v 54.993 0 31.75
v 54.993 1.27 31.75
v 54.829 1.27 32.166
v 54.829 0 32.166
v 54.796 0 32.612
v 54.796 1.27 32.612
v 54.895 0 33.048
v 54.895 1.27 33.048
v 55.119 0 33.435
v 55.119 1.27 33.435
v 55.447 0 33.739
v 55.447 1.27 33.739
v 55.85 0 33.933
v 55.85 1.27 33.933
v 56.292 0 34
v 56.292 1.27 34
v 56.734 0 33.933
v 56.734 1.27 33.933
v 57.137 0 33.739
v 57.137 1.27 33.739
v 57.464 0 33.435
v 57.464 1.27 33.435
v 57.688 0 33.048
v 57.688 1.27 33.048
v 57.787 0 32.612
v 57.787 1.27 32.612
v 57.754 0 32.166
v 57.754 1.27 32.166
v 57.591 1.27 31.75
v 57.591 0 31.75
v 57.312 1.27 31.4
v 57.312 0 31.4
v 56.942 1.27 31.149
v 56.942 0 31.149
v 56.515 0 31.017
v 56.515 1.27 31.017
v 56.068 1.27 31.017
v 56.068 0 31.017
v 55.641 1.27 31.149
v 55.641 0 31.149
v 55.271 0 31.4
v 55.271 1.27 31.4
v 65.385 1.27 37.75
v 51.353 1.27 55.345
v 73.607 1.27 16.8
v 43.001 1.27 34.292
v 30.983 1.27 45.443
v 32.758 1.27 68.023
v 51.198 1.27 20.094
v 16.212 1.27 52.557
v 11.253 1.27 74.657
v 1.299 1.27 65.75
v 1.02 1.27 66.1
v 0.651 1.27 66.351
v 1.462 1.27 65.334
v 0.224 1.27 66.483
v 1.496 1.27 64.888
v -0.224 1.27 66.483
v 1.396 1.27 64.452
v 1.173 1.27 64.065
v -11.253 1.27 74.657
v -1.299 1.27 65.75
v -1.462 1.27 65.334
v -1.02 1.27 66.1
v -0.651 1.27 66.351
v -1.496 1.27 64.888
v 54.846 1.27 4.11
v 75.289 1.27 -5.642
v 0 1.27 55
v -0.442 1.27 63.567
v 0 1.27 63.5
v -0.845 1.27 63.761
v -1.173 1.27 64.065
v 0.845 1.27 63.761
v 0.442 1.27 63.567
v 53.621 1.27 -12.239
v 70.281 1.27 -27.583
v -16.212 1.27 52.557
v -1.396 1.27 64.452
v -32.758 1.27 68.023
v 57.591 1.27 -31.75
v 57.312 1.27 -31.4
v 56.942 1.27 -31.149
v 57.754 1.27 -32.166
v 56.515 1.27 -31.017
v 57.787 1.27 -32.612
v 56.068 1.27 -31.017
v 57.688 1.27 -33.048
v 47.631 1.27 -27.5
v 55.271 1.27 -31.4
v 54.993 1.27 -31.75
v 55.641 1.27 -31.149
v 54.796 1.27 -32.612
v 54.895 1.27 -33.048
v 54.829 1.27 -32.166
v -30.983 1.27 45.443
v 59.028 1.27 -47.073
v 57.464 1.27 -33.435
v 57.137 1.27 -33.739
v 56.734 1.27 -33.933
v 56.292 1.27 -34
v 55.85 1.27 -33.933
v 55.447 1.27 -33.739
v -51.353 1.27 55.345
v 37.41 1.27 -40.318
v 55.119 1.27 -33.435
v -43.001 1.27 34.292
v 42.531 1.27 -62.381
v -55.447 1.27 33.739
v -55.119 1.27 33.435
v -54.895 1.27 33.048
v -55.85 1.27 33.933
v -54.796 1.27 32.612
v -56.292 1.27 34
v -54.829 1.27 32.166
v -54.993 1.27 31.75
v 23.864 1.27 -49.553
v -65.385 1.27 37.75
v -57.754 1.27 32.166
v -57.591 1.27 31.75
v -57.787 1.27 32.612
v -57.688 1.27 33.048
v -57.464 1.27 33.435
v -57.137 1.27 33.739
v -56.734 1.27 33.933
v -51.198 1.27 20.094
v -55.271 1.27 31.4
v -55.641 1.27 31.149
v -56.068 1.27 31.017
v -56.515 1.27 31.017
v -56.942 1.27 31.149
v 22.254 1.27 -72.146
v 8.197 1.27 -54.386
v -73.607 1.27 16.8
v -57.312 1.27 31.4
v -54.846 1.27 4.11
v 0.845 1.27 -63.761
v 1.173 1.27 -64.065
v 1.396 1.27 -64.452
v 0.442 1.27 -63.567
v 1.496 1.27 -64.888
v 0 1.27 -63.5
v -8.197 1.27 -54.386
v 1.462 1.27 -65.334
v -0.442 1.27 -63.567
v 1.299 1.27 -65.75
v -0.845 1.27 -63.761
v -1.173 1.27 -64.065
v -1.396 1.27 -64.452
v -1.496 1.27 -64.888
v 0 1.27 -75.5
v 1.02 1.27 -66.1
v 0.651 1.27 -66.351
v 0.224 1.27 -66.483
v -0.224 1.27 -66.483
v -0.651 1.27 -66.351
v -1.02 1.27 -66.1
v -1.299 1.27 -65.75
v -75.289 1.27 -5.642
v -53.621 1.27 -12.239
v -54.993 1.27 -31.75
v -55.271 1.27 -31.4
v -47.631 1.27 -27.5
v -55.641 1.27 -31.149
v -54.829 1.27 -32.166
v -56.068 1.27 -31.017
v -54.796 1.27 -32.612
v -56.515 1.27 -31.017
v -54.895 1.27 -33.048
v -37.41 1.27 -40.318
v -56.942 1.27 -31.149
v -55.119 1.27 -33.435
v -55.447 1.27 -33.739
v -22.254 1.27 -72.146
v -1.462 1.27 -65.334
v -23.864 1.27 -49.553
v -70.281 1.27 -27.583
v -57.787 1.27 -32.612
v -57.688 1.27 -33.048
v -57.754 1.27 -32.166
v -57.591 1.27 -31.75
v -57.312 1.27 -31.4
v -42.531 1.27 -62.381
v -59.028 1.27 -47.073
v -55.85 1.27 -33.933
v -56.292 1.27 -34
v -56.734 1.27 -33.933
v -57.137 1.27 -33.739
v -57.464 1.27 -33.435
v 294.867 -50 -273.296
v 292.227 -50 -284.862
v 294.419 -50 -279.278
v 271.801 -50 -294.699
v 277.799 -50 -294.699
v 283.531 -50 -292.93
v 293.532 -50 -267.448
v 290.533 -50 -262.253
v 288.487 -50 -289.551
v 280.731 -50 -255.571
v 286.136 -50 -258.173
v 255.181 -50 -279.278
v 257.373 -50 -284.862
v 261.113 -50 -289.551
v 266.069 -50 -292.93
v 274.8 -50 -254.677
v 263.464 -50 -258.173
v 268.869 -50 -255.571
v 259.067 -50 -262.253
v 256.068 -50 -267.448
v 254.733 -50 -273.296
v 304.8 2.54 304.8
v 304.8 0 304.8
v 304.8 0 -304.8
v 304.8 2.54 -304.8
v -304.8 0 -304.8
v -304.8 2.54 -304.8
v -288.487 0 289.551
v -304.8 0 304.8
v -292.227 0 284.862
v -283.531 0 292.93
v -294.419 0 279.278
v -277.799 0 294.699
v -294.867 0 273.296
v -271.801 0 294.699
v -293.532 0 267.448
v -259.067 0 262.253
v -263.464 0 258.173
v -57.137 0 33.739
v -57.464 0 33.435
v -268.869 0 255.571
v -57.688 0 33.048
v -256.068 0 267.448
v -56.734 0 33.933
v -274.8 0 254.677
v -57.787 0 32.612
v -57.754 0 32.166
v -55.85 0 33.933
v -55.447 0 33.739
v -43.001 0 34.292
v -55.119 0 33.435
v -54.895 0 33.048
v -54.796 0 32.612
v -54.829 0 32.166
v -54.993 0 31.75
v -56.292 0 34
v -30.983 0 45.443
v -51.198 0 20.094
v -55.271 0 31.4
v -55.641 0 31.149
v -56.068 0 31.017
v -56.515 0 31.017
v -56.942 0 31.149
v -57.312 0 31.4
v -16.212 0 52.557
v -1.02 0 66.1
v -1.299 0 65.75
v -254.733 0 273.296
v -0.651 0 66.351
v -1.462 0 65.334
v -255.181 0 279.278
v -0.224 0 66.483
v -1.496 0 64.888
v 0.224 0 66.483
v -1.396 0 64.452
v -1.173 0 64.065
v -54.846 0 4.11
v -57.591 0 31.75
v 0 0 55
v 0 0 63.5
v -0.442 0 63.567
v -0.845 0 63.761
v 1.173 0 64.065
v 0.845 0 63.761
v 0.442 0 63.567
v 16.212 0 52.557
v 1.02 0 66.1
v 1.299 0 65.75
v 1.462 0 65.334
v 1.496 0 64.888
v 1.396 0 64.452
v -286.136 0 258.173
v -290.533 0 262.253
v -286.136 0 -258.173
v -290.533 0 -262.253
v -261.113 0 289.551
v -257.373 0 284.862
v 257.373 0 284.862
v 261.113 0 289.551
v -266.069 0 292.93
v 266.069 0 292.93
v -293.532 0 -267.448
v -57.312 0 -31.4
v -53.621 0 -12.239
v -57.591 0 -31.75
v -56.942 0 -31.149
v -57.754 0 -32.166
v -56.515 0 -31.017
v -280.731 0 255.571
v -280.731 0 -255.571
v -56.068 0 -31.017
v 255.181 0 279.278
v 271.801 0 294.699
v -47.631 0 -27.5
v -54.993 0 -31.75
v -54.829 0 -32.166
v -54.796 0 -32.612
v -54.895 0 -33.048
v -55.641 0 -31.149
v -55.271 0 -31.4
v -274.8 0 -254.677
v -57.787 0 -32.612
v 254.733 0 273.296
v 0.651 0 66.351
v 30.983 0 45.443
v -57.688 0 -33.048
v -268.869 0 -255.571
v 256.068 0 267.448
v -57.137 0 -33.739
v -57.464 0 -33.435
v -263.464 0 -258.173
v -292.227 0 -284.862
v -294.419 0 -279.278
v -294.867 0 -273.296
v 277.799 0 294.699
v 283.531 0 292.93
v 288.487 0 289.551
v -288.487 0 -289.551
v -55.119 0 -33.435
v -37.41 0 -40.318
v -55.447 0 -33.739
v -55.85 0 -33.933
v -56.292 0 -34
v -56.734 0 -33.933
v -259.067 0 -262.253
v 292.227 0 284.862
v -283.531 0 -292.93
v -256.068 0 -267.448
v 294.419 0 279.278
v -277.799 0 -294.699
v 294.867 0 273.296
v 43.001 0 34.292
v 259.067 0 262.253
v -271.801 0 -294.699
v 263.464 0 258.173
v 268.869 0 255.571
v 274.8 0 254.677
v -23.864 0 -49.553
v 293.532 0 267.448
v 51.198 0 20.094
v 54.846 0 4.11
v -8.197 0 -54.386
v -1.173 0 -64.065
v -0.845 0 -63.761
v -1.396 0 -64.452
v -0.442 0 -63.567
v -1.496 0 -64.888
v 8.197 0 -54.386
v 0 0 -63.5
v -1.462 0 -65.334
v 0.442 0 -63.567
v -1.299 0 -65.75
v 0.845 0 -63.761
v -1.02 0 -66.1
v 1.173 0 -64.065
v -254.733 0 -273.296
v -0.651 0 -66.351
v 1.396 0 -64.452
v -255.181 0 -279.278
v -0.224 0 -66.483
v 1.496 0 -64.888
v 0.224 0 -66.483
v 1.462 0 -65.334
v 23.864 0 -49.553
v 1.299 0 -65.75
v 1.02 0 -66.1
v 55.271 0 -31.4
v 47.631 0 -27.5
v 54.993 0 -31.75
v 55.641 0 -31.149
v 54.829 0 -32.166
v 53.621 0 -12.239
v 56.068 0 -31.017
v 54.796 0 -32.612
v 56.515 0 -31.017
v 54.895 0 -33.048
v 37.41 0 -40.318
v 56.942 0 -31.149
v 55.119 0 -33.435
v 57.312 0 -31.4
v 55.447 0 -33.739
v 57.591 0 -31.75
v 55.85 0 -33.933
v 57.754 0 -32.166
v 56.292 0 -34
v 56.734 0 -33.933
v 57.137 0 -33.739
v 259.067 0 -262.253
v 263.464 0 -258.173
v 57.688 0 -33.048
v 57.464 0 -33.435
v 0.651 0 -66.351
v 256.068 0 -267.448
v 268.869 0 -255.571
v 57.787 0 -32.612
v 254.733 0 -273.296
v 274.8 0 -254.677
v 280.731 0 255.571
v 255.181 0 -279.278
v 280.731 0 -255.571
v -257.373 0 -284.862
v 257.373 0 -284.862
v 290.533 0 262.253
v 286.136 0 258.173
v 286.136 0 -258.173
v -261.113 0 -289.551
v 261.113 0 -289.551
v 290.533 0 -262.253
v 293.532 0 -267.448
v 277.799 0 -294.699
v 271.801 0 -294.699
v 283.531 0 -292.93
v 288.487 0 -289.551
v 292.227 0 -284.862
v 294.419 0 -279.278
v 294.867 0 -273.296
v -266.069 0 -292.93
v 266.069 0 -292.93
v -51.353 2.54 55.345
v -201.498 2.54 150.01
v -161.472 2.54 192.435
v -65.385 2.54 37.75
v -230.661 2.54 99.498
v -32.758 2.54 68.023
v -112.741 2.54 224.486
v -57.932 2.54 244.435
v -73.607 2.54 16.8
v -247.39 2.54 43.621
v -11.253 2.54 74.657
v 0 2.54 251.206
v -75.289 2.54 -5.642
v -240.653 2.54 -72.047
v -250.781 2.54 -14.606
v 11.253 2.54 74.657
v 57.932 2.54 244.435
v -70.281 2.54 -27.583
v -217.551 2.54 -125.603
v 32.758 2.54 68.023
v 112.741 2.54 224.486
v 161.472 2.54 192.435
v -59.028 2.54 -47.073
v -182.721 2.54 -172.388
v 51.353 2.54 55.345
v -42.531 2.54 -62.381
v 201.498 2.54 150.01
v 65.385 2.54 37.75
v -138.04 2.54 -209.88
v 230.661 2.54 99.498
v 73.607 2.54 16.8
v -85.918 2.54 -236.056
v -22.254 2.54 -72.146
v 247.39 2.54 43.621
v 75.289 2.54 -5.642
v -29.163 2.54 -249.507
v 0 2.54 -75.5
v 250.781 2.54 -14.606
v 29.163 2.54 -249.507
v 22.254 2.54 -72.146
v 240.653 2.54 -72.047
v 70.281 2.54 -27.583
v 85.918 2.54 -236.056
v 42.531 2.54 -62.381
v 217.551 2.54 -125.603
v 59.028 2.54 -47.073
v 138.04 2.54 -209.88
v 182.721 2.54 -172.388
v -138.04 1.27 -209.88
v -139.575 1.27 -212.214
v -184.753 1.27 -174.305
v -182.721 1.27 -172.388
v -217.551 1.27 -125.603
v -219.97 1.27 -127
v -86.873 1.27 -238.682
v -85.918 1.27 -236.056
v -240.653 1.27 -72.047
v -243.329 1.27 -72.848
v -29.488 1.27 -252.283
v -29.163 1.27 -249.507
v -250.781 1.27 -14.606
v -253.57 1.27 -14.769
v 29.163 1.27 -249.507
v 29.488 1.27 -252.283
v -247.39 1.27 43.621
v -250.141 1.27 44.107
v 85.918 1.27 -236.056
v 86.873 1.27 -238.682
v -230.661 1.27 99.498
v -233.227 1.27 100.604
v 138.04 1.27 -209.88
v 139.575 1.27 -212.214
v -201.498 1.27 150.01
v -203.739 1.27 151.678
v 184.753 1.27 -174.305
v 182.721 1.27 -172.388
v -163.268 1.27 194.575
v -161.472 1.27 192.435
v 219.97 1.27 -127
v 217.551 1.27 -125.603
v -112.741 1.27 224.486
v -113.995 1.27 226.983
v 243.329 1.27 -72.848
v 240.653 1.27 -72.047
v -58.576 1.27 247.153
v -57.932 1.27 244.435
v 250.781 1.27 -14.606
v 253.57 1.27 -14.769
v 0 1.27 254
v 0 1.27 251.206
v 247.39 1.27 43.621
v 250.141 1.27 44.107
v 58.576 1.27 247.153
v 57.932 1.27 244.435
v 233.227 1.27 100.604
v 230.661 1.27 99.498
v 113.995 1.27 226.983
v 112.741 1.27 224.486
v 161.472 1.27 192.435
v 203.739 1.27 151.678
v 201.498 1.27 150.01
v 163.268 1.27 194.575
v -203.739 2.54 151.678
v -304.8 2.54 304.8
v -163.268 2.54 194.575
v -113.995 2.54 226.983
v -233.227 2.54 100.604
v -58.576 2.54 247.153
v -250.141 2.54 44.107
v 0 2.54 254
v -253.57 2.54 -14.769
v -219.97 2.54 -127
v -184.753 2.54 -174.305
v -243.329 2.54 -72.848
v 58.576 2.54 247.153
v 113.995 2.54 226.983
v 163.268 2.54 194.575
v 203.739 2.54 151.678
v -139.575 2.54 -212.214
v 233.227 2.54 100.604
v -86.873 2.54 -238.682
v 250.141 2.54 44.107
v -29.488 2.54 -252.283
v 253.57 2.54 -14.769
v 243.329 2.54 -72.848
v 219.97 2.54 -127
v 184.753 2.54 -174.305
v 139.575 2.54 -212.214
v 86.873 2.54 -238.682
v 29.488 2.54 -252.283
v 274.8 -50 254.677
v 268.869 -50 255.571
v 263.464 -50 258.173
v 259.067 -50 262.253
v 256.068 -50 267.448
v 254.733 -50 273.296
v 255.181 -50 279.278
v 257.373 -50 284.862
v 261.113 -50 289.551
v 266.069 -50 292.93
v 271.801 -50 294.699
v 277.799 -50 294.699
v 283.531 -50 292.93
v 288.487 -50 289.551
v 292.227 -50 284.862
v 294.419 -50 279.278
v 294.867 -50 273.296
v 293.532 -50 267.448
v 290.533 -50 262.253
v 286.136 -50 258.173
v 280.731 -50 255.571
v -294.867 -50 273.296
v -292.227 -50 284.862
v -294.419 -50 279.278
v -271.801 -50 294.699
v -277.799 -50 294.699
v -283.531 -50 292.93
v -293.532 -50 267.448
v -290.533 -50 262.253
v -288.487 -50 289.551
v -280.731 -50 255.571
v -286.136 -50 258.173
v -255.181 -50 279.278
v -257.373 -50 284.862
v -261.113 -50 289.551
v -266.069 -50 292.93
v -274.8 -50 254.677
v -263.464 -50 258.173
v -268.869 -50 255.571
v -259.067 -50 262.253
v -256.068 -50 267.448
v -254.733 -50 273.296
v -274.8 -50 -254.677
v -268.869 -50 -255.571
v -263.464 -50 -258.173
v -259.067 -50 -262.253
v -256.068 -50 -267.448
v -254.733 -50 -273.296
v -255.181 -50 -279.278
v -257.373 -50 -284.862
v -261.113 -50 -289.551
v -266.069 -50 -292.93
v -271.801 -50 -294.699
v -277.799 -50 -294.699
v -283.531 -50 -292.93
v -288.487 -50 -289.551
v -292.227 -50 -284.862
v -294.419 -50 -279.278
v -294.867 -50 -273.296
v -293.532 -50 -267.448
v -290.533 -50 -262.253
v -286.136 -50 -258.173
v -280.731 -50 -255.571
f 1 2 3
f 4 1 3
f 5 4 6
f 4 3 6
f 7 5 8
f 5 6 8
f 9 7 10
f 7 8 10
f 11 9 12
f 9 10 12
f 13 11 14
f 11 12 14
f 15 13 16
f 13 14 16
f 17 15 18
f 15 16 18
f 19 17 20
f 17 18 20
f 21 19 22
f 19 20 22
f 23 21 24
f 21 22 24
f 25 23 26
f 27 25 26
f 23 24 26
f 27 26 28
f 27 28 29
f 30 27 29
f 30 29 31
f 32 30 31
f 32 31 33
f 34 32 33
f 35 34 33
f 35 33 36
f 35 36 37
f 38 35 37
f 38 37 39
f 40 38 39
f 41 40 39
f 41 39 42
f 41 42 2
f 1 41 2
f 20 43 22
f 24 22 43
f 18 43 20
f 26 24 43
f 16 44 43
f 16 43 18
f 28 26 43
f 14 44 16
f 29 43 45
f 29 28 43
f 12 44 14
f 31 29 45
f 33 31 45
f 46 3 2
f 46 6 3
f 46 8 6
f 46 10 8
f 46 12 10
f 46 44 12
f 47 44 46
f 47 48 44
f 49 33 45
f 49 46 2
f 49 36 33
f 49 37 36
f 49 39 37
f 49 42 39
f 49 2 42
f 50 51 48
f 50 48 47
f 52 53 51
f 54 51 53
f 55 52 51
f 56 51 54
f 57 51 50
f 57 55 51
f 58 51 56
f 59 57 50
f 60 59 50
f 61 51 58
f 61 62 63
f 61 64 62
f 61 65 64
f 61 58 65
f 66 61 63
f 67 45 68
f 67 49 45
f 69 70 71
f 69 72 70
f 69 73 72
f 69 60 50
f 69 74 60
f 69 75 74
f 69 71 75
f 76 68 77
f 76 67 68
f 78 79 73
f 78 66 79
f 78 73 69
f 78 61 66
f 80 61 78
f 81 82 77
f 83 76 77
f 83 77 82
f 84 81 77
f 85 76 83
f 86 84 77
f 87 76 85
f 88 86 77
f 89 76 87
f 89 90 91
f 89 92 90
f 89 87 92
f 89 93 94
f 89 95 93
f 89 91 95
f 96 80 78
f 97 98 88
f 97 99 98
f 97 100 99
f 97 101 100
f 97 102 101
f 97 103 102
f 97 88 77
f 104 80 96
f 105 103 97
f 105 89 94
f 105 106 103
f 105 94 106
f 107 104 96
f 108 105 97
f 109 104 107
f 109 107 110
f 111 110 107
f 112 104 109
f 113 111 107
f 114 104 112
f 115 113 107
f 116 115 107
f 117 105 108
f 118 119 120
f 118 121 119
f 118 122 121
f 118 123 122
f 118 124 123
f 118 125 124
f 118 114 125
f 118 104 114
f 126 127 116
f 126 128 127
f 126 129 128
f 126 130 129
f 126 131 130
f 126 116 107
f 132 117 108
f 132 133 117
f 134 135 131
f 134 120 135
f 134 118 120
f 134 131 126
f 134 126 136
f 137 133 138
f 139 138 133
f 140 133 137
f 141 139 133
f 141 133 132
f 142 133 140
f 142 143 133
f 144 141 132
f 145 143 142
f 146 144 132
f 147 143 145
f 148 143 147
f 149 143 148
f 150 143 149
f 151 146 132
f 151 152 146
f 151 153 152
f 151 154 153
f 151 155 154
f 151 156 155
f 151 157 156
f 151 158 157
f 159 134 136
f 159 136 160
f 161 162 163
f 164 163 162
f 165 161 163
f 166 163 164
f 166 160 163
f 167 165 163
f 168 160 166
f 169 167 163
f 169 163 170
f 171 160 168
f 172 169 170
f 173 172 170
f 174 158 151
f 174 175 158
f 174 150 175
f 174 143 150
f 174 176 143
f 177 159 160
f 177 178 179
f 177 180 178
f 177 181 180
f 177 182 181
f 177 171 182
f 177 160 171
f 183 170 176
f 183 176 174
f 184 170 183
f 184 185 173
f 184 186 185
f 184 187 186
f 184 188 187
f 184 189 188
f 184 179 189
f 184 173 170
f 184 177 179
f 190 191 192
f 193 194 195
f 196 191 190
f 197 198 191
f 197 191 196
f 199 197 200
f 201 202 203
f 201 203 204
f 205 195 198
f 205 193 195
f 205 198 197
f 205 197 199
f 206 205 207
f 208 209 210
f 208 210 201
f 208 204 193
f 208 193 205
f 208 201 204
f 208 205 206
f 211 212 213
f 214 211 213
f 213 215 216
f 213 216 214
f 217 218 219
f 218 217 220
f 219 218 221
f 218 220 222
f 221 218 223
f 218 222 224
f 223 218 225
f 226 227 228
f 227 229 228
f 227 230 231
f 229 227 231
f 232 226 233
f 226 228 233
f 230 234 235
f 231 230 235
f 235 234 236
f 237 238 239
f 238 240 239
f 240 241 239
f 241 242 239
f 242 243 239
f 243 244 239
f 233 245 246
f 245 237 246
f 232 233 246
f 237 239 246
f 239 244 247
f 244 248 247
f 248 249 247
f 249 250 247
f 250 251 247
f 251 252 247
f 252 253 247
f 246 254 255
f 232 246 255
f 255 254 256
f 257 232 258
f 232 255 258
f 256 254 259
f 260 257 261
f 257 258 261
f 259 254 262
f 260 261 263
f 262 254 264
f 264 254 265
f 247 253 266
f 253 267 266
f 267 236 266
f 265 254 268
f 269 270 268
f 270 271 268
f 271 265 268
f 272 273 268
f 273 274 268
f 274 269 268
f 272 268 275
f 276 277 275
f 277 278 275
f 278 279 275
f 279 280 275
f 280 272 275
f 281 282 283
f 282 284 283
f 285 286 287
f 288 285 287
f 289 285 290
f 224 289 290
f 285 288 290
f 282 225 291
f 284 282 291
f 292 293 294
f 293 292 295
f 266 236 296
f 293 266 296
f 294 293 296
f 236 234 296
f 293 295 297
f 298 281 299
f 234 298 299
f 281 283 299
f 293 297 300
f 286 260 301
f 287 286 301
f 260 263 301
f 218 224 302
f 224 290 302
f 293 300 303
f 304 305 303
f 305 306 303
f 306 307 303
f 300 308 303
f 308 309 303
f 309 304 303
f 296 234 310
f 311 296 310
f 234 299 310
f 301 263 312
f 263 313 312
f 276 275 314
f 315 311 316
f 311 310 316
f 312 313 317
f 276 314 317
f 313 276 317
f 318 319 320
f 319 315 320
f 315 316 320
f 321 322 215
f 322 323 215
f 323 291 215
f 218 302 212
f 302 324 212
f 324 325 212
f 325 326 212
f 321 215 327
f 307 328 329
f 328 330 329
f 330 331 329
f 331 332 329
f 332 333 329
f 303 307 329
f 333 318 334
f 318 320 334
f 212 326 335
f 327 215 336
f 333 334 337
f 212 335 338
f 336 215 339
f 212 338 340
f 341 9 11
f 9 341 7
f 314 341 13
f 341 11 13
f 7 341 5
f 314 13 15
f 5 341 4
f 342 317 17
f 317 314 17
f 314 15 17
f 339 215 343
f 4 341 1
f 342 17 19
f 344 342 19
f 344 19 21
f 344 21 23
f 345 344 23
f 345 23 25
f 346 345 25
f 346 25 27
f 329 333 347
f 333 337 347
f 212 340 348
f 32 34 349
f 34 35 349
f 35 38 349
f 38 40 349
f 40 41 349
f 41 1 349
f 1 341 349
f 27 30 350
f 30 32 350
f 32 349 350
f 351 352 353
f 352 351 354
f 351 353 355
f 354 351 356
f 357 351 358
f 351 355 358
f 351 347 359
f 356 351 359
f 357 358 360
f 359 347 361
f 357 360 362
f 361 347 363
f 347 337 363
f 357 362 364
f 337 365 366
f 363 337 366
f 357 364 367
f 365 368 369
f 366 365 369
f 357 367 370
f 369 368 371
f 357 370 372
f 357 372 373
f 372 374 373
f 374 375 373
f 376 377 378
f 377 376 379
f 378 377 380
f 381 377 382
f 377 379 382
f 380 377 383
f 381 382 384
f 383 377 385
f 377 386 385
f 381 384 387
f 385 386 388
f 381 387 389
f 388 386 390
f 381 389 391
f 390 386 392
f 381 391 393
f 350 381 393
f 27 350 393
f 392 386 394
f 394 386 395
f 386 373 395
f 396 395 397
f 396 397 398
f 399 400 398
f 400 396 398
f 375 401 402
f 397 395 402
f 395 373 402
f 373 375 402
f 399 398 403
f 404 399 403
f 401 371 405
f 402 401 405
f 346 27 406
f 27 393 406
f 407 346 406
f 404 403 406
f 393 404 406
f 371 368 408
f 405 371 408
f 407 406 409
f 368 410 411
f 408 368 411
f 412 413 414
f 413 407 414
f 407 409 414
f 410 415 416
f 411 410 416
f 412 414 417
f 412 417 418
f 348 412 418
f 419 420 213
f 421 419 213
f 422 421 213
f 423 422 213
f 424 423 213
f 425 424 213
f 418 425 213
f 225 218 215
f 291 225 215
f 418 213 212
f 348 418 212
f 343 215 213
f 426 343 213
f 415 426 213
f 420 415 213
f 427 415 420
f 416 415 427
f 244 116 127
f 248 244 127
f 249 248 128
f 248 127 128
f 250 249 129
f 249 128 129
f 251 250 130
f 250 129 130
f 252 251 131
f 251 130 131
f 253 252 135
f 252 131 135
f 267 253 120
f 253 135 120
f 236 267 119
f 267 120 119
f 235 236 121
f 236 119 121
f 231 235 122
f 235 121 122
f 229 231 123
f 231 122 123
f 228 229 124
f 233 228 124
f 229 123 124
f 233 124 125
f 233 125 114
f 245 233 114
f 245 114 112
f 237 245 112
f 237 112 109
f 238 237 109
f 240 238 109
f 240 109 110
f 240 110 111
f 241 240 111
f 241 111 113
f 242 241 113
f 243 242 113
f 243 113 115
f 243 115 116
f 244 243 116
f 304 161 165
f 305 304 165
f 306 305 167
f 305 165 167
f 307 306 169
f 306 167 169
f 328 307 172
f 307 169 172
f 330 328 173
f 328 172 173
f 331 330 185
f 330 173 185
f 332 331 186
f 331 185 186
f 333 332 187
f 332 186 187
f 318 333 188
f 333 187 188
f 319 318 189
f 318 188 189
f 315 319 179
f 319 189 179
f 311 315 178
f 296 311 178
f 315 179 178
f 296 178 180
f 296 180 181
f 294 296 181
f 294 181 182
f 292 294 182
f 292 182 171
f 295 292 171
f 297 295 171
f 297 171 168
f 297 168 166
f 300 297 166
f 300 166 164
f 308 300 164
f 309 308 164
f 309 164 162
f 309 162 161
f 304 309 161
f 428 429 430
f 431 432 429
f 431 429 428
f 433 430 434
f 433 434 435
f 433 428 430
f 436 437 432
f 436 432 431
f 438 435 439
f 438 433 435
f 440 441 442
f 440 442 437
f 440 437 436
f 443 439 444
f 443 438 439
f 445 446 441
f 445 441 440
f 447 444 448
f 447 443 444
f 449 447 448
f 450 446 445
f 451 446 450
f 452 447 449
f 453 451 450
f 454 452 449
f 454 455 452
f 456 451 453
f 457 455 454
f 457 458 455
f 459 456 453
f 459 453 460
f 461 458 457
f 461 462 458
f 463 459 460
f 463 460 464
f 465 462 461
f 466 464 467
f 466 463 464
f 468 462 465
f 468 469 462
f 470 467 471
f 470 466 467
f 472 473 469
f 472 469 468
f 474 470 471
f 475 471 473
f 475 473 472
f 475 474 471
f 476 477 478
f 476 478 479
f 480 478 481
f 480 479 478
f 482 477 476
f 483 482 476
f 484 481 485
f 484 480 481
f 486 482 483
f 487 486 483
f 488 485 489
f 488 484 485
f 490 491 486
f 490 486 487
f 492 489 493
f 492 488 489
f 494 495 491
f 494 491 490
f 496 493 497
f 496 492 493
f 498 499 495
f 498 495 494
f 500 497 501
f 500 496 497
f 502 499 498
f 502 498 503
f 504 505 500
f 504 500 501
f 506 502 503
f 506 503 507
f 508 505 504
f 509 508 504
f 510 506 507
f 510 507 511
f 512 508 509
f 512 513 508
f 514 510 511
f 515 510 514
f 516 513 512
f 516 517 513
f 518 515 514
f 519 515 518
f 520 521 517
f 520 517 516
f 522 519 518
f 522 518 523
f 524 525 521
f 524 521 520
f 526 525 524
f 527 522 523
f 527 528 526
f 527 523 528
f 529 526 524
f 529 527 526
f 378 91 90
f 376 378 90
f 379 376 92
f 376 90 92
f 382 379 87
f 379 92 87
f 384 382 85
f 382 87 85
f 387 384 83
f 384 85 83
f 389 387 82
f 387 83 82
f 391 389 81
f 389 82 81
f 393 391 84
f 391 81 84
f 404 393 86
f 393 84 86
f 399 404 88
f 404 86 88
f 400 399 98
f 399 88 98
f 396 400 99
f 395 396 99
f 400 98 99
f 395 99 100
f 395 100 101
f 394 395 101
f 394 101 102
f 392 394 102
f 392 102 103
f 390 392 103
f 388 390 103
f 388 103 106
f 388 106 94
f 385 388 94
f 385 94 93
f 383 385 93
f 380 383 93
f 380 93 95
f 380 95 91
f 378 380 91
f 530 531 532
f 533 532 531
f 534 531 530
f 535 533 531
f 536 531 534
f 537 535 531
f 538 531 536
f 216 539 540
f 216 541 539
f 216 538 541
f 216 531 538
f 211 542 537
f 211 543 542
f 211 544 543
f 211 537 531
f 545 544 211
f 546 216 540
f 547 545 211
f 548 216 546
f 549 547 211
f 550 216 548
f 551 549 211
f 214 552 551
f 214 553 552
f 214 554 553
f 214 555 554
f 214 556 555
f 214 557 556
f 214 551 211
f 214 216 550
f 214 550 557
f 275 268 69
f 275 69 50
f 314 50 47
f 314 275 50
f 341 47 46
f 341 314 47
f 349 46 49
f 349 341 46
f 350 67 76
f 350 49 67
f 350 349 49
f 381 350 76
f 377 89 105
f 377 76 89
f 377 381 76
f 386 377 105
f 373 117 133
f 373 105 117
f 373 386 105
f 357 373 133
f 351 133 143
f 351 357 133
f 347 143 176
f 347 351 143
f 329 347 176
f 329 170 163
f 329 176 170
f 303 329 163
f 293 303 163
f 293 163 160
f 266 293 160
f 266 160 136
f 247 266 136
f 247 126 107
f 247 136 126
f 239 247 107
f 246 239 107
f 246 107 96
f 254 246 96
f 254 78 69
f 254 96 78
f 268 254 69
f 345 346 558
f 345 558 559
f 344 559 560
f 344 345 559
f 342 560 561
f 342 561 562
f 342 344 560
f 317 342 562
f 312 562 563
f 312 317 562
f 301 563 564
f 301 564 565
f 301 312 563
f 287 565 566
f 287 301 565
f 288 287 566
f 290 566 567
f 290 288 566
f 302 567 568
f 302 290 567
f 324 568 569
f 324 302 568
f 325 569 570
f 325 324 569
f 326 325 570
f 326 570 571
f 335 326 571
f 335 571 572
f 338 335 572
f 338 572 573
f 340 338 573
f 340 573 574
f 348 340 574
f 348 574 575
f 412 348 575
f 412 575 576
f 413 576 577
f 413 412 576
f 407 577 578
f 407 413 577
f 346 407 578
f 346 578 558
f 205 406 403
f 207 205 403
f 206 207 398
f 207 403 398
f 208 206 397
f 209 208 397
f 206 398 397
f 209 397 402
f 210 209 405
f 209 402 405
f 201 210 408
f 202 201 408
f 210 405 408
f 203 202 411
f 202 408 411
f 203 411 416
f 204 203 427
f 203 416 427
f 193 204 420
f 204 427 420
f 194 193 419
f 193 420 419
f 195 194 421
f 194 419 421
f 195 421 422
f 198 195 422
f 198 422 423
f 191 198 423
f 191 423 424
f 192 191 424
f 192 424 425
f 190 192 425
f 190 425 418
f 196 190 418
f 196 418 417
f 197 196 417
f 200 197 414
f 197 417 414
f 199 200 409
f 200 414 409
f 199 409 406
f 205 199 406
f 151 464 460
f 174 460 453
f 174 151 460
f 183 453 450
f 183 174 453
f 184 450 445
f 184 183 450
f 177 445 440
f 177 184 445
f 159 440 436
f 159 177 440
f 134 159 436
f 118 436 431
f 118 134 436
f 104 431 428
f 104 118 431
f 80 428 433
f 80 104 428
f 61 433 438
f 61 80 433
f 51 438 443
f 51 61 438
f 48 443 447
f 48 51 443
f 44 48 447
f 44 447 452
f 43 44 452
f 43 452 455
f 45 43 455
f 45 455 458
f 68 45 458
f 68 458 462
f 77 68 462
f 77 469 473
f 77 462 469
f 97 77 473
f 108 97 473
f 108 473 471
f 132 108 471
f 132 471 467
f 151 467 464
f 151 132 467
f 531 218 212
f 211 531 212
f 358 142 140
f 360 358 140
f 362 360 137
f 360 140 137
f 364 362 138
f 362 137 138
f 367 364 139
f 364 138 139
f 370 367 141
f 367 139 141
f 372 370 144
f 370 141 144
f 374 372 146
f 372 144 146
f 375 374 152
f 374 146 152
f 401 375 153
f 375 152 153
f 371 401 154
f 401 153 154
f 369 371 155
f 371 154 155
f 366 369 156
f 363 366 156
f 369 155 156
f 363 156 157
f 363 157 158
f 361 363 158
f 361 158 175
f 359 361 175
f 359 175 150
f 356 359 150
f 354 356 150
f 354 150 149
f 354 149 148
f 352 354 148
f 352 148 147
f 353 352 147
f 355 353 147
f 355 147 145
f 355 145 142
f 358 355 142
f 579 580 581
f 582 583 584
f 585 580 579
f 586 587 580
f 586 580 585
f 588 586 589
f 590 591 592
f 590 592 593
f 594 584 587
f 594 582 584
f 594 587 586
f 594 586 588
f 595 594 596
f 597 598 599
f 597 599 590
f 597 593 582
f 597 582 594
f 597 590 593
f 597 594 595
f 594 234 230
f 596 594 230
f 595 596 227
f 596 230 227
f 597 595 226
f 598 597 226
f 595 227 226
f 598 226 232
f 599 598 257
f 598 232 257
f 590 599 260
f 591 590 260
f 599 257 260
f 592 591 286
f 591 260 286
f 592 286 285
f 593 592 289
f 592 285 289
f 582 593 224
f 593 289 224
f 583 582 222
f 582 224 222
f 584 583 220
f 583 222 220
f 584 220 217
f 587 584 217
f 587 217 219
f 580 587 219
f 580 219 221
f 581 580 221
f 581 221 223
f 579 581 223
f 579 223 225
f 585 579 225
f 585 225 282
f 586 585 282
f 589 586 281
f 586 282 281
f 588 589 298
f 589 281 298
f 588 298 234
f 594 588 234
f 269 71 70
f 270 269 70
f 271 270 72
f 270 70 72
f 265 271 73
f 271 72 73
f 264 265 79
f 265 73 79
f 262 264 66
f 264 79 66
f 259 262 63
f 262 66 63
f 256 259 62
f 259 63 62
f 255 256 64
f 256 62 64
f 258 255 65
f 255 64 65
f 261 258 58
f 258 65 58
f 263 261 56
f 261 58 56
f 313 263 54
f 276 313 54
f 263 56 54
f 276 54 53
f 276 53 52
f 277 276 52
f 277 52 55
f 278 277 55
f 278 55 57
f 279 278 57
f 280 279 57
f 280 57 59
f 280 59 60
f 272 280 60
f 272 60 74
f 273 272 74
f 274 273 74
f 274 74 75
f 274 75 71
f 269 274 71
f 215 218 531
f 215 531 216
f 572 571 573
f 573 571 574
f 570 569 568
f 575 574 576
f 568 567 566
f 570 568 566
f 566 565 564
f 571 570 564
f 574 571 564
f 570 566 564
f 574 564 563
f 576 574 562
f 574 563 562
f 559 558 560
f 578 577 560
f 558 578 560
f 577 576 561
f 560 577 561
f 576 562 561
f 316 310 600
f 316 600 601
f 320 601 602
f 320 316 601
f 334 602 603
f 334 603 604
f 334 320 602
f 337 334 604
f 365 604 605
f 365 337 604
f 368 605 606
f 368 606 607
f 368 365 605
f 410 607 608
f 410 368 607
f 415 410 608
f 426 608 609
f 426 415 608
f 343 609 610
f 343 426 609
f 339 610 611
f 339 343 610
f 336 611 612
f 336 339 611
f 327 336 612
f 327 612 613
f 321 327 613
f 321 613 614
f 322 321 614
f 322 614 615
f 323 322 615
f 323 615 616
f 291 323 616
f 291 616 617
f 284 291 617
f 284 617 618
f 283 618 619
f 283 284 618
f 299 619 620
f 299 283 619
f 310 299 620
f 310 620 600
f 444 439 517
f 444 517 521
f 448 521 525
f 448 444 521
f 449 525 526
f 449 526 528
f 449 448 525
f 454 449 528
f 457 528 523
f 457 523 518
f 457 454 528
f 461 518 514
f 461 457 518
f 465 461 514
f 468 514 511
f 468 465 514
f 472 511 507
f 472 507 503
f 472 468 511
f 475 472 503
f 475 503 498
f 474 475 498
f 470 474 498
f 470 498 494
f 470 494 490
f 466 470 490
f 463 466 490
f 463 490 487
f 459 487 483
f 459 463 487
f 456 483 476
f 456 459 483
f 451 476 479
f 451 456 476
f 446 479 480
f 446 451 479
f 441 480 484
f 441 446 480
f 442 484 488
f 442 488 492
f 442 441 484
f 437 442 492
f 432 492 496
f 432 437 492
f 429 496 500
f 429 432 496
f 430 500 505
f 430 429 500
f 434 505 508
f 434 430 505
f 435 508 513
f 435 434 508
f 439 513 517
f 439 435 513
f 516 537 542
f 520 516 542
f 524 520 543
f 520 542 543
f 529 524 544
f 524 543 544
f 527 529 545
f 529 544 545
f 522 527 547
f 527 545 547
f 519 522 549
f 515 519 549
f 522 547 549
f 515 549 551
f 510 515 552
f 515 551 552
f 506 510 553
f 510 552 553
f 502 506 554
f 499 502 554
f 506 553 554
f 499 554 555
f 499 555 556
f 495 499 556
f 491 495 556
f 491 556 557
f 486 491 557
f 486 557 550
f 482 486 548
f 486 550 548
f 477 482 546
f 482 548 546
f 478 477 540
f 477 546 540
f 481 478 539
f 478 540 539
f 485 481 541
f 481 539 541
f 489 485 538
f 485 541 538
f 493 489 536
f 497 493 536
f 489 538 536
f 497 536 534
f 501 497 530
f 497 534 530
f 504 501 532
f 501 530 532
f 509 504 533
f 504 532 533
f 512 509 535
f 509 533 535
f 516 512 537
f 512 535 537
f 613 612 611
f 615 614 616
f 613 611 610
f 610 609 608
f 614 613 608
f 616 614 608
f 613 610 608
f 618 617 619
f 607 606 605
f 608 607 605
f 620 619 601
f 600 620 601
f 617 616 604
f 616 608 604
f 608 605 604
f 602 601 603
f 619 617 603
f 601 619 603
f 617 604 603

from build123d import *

# Parameters (mm, degrees)
SKETCH2_W                                  = 609.6
SKETCH2_H                                  = 609.6
BOSS_EXTRUDE1_DEPTH                        = 2.54
CUT_EXTRUDE1_DEPTH                         = 432.059777293
CUT_EXTRUDE1_DEPTH_BACK                    = 1.27
SKETCH5_R                                  = 75.5
CUT_EXTRUDE2_DEPTH                         = 432.054164694
CUT_EXTRUDE2_DEPTH_BACK                    = 432.054164694
SKETCH7_R                                  = 55
SKETCH12_R                                 = 20.123320675
BOSS_EXTRUDE2_DEPTH                        = 50
SKETCH13_R                                 = 1.5
CUT_EXTRUDE3_DEPTH                         = 10
CIRPATTERN2_COUNT                          = 6
MIRROR1_AT_THE_SECOND_PLANE_COPY_1_SKETC_R = 20.123320675
MIRROR1_AT_THE_SECOND_PLANE_COPY_1_DEPTH   = 50
SKETCH16_R                                 = 254
SKETCH16_R_2                               = 251.206
CUT_EXTRUDE6_DEPTH                         = 1.27


with BuildPart() as part:
    # Sketch2 → Boss-Extrude1 (new body)
    with BuildSketch(Plane(origin=(0, 0, 0), x_dir=(1, 0, 0), z_dir=(0, 1, 0))):
        Rectangle(SKETCH2_W, SKETCH2_H)
    extrude(amount=BOSS_EXTRUDE1_DEPTH)

    # Sketch5 → Cut-Extrude1 (cut, two sides: drawn at the far end of the back side and taken through both)
    with BuildSketch(Plane(origin=(0, 2.54, 0), x_dir=(1, 0, 0), z_dir=(0, 1, 0)).offset(-CUT_EXTRUDE1_DEPTH_BACK)):
        with Locations(Location((0, 0, 0), (0, 0, 90))):
            Circle(SKETCH5_R)
    extrude(amount=CUT_EXTRUDE1_DEPTH + CUT_EXTRUDE1_DEPTH_BACK, mode=Mode.SUBTRACT)

    # Sketch7 → Cut-Extrude2 (cut, two sides: drawn at the far end of the back side and taken through both)
    with BuildSketch(Plane(origin=(0, 1.27, 0), x_dir=(1, 0, 0), z_dir=(0, 1, 0)).offset(-CUT_EXTRUDE2_DEPTH_BACK)):
        with Locations(Location((0, 0, 0), (0, 0, 270))):
            Circle(SKETCH7_R)
    extrude(amount=CUT_EXTRUDE2_DEPTH + CUT_EXTRUDE2_DEPTH_BACK, mode=Mode.SUBTRACT)

    # Sketch12 → Boss-Extrude2 (add)
    with BuildSketch(Plane.XZ):
        with Locations(Location((-274.8, 274.8, 0), (0, 0, 270))):
            Circle(SKETCH12_R)
    boss_extrude2 = extrude(amount=BOSS_EXTRUDE2_DEPTH)

    # Sketch13 → Cut-Extrude3 (cut)
    with BuildSketch(Plane(origin=(0, 1.27, 0), x_dir=(1, 0, 0), z_dir=(0, 1, 0))):
        with Locations(Location((0, 65, 0), (0, 0, 270))):
            Circle(SKETCH13_R)
    cut_extrude3 = extrude(amount=-CUT_EXTRUDE3_DEPTH, mode=Mode.SUBTRACT)

    # CirPattern2: Cut-Extrude3 ×6 about axis
    cirpattern2_axis = Axis((0, 0, 0), (0, 1, 0))
    for i in range(1, CIRPATTERN2_COUNT):
        add(cut_extrude3.rotate(cirpattern2_axis, i * 360 / CIRPATTERN2_COUNT), mode=Mode.SUBTRACT)

    # Mirror1: Boss-Extrude2 across plane
    add(boss_extrude2.mirror(Plane.XY))

    # Mirror1 at the second plane: Boss-Extrude2 across plane
    add(boss_extrude2.mirror(Plane(origin=(0, 0, 0), x_dir=(0, 0, 1), z_dir=(1, 0, 0))))

    # Mirror1 at the second plane copy 1 sketc → Mirror1 at the second plane copy 1 (add)
    with BuildSketch(Plane(origin=(0, 0, 0), x_dir=(-1, 0, 0), z_dir=(0, -1, 0))):
        with Locations(Location((-274.8, 274.8, 0), (0, 0, 270))):
            Circle(MIRROR1_AT_THE_SECOND_PLANE_COPY_1_SKETC_R)
    extrude(amount=MIRROR1_AT_THE_SECOND_PLANE_COPY_1_DEPTH)

    # Sketch16 → Cut-Extrude6 (cut)
    with BuildSketch(Plane(origin=(0, 2.54, 0), x_dir=(1, 0, 0), z_dir=(0, 1, 0))):
        with Locations(Location((0, 0, 0), (0, 0, 270))):
            Circle(SKETCH16_R)
        with Locations(Location((0, 0, 0), (0, 0, 270))):
            Circle(SKETCH16_R_2, mode=Mode.SUBTRACT)
    extrude(amount=-CUT_EXTRUDE6_DEPTH, mode=Mode.SUBTRACT)


solid = part.part
